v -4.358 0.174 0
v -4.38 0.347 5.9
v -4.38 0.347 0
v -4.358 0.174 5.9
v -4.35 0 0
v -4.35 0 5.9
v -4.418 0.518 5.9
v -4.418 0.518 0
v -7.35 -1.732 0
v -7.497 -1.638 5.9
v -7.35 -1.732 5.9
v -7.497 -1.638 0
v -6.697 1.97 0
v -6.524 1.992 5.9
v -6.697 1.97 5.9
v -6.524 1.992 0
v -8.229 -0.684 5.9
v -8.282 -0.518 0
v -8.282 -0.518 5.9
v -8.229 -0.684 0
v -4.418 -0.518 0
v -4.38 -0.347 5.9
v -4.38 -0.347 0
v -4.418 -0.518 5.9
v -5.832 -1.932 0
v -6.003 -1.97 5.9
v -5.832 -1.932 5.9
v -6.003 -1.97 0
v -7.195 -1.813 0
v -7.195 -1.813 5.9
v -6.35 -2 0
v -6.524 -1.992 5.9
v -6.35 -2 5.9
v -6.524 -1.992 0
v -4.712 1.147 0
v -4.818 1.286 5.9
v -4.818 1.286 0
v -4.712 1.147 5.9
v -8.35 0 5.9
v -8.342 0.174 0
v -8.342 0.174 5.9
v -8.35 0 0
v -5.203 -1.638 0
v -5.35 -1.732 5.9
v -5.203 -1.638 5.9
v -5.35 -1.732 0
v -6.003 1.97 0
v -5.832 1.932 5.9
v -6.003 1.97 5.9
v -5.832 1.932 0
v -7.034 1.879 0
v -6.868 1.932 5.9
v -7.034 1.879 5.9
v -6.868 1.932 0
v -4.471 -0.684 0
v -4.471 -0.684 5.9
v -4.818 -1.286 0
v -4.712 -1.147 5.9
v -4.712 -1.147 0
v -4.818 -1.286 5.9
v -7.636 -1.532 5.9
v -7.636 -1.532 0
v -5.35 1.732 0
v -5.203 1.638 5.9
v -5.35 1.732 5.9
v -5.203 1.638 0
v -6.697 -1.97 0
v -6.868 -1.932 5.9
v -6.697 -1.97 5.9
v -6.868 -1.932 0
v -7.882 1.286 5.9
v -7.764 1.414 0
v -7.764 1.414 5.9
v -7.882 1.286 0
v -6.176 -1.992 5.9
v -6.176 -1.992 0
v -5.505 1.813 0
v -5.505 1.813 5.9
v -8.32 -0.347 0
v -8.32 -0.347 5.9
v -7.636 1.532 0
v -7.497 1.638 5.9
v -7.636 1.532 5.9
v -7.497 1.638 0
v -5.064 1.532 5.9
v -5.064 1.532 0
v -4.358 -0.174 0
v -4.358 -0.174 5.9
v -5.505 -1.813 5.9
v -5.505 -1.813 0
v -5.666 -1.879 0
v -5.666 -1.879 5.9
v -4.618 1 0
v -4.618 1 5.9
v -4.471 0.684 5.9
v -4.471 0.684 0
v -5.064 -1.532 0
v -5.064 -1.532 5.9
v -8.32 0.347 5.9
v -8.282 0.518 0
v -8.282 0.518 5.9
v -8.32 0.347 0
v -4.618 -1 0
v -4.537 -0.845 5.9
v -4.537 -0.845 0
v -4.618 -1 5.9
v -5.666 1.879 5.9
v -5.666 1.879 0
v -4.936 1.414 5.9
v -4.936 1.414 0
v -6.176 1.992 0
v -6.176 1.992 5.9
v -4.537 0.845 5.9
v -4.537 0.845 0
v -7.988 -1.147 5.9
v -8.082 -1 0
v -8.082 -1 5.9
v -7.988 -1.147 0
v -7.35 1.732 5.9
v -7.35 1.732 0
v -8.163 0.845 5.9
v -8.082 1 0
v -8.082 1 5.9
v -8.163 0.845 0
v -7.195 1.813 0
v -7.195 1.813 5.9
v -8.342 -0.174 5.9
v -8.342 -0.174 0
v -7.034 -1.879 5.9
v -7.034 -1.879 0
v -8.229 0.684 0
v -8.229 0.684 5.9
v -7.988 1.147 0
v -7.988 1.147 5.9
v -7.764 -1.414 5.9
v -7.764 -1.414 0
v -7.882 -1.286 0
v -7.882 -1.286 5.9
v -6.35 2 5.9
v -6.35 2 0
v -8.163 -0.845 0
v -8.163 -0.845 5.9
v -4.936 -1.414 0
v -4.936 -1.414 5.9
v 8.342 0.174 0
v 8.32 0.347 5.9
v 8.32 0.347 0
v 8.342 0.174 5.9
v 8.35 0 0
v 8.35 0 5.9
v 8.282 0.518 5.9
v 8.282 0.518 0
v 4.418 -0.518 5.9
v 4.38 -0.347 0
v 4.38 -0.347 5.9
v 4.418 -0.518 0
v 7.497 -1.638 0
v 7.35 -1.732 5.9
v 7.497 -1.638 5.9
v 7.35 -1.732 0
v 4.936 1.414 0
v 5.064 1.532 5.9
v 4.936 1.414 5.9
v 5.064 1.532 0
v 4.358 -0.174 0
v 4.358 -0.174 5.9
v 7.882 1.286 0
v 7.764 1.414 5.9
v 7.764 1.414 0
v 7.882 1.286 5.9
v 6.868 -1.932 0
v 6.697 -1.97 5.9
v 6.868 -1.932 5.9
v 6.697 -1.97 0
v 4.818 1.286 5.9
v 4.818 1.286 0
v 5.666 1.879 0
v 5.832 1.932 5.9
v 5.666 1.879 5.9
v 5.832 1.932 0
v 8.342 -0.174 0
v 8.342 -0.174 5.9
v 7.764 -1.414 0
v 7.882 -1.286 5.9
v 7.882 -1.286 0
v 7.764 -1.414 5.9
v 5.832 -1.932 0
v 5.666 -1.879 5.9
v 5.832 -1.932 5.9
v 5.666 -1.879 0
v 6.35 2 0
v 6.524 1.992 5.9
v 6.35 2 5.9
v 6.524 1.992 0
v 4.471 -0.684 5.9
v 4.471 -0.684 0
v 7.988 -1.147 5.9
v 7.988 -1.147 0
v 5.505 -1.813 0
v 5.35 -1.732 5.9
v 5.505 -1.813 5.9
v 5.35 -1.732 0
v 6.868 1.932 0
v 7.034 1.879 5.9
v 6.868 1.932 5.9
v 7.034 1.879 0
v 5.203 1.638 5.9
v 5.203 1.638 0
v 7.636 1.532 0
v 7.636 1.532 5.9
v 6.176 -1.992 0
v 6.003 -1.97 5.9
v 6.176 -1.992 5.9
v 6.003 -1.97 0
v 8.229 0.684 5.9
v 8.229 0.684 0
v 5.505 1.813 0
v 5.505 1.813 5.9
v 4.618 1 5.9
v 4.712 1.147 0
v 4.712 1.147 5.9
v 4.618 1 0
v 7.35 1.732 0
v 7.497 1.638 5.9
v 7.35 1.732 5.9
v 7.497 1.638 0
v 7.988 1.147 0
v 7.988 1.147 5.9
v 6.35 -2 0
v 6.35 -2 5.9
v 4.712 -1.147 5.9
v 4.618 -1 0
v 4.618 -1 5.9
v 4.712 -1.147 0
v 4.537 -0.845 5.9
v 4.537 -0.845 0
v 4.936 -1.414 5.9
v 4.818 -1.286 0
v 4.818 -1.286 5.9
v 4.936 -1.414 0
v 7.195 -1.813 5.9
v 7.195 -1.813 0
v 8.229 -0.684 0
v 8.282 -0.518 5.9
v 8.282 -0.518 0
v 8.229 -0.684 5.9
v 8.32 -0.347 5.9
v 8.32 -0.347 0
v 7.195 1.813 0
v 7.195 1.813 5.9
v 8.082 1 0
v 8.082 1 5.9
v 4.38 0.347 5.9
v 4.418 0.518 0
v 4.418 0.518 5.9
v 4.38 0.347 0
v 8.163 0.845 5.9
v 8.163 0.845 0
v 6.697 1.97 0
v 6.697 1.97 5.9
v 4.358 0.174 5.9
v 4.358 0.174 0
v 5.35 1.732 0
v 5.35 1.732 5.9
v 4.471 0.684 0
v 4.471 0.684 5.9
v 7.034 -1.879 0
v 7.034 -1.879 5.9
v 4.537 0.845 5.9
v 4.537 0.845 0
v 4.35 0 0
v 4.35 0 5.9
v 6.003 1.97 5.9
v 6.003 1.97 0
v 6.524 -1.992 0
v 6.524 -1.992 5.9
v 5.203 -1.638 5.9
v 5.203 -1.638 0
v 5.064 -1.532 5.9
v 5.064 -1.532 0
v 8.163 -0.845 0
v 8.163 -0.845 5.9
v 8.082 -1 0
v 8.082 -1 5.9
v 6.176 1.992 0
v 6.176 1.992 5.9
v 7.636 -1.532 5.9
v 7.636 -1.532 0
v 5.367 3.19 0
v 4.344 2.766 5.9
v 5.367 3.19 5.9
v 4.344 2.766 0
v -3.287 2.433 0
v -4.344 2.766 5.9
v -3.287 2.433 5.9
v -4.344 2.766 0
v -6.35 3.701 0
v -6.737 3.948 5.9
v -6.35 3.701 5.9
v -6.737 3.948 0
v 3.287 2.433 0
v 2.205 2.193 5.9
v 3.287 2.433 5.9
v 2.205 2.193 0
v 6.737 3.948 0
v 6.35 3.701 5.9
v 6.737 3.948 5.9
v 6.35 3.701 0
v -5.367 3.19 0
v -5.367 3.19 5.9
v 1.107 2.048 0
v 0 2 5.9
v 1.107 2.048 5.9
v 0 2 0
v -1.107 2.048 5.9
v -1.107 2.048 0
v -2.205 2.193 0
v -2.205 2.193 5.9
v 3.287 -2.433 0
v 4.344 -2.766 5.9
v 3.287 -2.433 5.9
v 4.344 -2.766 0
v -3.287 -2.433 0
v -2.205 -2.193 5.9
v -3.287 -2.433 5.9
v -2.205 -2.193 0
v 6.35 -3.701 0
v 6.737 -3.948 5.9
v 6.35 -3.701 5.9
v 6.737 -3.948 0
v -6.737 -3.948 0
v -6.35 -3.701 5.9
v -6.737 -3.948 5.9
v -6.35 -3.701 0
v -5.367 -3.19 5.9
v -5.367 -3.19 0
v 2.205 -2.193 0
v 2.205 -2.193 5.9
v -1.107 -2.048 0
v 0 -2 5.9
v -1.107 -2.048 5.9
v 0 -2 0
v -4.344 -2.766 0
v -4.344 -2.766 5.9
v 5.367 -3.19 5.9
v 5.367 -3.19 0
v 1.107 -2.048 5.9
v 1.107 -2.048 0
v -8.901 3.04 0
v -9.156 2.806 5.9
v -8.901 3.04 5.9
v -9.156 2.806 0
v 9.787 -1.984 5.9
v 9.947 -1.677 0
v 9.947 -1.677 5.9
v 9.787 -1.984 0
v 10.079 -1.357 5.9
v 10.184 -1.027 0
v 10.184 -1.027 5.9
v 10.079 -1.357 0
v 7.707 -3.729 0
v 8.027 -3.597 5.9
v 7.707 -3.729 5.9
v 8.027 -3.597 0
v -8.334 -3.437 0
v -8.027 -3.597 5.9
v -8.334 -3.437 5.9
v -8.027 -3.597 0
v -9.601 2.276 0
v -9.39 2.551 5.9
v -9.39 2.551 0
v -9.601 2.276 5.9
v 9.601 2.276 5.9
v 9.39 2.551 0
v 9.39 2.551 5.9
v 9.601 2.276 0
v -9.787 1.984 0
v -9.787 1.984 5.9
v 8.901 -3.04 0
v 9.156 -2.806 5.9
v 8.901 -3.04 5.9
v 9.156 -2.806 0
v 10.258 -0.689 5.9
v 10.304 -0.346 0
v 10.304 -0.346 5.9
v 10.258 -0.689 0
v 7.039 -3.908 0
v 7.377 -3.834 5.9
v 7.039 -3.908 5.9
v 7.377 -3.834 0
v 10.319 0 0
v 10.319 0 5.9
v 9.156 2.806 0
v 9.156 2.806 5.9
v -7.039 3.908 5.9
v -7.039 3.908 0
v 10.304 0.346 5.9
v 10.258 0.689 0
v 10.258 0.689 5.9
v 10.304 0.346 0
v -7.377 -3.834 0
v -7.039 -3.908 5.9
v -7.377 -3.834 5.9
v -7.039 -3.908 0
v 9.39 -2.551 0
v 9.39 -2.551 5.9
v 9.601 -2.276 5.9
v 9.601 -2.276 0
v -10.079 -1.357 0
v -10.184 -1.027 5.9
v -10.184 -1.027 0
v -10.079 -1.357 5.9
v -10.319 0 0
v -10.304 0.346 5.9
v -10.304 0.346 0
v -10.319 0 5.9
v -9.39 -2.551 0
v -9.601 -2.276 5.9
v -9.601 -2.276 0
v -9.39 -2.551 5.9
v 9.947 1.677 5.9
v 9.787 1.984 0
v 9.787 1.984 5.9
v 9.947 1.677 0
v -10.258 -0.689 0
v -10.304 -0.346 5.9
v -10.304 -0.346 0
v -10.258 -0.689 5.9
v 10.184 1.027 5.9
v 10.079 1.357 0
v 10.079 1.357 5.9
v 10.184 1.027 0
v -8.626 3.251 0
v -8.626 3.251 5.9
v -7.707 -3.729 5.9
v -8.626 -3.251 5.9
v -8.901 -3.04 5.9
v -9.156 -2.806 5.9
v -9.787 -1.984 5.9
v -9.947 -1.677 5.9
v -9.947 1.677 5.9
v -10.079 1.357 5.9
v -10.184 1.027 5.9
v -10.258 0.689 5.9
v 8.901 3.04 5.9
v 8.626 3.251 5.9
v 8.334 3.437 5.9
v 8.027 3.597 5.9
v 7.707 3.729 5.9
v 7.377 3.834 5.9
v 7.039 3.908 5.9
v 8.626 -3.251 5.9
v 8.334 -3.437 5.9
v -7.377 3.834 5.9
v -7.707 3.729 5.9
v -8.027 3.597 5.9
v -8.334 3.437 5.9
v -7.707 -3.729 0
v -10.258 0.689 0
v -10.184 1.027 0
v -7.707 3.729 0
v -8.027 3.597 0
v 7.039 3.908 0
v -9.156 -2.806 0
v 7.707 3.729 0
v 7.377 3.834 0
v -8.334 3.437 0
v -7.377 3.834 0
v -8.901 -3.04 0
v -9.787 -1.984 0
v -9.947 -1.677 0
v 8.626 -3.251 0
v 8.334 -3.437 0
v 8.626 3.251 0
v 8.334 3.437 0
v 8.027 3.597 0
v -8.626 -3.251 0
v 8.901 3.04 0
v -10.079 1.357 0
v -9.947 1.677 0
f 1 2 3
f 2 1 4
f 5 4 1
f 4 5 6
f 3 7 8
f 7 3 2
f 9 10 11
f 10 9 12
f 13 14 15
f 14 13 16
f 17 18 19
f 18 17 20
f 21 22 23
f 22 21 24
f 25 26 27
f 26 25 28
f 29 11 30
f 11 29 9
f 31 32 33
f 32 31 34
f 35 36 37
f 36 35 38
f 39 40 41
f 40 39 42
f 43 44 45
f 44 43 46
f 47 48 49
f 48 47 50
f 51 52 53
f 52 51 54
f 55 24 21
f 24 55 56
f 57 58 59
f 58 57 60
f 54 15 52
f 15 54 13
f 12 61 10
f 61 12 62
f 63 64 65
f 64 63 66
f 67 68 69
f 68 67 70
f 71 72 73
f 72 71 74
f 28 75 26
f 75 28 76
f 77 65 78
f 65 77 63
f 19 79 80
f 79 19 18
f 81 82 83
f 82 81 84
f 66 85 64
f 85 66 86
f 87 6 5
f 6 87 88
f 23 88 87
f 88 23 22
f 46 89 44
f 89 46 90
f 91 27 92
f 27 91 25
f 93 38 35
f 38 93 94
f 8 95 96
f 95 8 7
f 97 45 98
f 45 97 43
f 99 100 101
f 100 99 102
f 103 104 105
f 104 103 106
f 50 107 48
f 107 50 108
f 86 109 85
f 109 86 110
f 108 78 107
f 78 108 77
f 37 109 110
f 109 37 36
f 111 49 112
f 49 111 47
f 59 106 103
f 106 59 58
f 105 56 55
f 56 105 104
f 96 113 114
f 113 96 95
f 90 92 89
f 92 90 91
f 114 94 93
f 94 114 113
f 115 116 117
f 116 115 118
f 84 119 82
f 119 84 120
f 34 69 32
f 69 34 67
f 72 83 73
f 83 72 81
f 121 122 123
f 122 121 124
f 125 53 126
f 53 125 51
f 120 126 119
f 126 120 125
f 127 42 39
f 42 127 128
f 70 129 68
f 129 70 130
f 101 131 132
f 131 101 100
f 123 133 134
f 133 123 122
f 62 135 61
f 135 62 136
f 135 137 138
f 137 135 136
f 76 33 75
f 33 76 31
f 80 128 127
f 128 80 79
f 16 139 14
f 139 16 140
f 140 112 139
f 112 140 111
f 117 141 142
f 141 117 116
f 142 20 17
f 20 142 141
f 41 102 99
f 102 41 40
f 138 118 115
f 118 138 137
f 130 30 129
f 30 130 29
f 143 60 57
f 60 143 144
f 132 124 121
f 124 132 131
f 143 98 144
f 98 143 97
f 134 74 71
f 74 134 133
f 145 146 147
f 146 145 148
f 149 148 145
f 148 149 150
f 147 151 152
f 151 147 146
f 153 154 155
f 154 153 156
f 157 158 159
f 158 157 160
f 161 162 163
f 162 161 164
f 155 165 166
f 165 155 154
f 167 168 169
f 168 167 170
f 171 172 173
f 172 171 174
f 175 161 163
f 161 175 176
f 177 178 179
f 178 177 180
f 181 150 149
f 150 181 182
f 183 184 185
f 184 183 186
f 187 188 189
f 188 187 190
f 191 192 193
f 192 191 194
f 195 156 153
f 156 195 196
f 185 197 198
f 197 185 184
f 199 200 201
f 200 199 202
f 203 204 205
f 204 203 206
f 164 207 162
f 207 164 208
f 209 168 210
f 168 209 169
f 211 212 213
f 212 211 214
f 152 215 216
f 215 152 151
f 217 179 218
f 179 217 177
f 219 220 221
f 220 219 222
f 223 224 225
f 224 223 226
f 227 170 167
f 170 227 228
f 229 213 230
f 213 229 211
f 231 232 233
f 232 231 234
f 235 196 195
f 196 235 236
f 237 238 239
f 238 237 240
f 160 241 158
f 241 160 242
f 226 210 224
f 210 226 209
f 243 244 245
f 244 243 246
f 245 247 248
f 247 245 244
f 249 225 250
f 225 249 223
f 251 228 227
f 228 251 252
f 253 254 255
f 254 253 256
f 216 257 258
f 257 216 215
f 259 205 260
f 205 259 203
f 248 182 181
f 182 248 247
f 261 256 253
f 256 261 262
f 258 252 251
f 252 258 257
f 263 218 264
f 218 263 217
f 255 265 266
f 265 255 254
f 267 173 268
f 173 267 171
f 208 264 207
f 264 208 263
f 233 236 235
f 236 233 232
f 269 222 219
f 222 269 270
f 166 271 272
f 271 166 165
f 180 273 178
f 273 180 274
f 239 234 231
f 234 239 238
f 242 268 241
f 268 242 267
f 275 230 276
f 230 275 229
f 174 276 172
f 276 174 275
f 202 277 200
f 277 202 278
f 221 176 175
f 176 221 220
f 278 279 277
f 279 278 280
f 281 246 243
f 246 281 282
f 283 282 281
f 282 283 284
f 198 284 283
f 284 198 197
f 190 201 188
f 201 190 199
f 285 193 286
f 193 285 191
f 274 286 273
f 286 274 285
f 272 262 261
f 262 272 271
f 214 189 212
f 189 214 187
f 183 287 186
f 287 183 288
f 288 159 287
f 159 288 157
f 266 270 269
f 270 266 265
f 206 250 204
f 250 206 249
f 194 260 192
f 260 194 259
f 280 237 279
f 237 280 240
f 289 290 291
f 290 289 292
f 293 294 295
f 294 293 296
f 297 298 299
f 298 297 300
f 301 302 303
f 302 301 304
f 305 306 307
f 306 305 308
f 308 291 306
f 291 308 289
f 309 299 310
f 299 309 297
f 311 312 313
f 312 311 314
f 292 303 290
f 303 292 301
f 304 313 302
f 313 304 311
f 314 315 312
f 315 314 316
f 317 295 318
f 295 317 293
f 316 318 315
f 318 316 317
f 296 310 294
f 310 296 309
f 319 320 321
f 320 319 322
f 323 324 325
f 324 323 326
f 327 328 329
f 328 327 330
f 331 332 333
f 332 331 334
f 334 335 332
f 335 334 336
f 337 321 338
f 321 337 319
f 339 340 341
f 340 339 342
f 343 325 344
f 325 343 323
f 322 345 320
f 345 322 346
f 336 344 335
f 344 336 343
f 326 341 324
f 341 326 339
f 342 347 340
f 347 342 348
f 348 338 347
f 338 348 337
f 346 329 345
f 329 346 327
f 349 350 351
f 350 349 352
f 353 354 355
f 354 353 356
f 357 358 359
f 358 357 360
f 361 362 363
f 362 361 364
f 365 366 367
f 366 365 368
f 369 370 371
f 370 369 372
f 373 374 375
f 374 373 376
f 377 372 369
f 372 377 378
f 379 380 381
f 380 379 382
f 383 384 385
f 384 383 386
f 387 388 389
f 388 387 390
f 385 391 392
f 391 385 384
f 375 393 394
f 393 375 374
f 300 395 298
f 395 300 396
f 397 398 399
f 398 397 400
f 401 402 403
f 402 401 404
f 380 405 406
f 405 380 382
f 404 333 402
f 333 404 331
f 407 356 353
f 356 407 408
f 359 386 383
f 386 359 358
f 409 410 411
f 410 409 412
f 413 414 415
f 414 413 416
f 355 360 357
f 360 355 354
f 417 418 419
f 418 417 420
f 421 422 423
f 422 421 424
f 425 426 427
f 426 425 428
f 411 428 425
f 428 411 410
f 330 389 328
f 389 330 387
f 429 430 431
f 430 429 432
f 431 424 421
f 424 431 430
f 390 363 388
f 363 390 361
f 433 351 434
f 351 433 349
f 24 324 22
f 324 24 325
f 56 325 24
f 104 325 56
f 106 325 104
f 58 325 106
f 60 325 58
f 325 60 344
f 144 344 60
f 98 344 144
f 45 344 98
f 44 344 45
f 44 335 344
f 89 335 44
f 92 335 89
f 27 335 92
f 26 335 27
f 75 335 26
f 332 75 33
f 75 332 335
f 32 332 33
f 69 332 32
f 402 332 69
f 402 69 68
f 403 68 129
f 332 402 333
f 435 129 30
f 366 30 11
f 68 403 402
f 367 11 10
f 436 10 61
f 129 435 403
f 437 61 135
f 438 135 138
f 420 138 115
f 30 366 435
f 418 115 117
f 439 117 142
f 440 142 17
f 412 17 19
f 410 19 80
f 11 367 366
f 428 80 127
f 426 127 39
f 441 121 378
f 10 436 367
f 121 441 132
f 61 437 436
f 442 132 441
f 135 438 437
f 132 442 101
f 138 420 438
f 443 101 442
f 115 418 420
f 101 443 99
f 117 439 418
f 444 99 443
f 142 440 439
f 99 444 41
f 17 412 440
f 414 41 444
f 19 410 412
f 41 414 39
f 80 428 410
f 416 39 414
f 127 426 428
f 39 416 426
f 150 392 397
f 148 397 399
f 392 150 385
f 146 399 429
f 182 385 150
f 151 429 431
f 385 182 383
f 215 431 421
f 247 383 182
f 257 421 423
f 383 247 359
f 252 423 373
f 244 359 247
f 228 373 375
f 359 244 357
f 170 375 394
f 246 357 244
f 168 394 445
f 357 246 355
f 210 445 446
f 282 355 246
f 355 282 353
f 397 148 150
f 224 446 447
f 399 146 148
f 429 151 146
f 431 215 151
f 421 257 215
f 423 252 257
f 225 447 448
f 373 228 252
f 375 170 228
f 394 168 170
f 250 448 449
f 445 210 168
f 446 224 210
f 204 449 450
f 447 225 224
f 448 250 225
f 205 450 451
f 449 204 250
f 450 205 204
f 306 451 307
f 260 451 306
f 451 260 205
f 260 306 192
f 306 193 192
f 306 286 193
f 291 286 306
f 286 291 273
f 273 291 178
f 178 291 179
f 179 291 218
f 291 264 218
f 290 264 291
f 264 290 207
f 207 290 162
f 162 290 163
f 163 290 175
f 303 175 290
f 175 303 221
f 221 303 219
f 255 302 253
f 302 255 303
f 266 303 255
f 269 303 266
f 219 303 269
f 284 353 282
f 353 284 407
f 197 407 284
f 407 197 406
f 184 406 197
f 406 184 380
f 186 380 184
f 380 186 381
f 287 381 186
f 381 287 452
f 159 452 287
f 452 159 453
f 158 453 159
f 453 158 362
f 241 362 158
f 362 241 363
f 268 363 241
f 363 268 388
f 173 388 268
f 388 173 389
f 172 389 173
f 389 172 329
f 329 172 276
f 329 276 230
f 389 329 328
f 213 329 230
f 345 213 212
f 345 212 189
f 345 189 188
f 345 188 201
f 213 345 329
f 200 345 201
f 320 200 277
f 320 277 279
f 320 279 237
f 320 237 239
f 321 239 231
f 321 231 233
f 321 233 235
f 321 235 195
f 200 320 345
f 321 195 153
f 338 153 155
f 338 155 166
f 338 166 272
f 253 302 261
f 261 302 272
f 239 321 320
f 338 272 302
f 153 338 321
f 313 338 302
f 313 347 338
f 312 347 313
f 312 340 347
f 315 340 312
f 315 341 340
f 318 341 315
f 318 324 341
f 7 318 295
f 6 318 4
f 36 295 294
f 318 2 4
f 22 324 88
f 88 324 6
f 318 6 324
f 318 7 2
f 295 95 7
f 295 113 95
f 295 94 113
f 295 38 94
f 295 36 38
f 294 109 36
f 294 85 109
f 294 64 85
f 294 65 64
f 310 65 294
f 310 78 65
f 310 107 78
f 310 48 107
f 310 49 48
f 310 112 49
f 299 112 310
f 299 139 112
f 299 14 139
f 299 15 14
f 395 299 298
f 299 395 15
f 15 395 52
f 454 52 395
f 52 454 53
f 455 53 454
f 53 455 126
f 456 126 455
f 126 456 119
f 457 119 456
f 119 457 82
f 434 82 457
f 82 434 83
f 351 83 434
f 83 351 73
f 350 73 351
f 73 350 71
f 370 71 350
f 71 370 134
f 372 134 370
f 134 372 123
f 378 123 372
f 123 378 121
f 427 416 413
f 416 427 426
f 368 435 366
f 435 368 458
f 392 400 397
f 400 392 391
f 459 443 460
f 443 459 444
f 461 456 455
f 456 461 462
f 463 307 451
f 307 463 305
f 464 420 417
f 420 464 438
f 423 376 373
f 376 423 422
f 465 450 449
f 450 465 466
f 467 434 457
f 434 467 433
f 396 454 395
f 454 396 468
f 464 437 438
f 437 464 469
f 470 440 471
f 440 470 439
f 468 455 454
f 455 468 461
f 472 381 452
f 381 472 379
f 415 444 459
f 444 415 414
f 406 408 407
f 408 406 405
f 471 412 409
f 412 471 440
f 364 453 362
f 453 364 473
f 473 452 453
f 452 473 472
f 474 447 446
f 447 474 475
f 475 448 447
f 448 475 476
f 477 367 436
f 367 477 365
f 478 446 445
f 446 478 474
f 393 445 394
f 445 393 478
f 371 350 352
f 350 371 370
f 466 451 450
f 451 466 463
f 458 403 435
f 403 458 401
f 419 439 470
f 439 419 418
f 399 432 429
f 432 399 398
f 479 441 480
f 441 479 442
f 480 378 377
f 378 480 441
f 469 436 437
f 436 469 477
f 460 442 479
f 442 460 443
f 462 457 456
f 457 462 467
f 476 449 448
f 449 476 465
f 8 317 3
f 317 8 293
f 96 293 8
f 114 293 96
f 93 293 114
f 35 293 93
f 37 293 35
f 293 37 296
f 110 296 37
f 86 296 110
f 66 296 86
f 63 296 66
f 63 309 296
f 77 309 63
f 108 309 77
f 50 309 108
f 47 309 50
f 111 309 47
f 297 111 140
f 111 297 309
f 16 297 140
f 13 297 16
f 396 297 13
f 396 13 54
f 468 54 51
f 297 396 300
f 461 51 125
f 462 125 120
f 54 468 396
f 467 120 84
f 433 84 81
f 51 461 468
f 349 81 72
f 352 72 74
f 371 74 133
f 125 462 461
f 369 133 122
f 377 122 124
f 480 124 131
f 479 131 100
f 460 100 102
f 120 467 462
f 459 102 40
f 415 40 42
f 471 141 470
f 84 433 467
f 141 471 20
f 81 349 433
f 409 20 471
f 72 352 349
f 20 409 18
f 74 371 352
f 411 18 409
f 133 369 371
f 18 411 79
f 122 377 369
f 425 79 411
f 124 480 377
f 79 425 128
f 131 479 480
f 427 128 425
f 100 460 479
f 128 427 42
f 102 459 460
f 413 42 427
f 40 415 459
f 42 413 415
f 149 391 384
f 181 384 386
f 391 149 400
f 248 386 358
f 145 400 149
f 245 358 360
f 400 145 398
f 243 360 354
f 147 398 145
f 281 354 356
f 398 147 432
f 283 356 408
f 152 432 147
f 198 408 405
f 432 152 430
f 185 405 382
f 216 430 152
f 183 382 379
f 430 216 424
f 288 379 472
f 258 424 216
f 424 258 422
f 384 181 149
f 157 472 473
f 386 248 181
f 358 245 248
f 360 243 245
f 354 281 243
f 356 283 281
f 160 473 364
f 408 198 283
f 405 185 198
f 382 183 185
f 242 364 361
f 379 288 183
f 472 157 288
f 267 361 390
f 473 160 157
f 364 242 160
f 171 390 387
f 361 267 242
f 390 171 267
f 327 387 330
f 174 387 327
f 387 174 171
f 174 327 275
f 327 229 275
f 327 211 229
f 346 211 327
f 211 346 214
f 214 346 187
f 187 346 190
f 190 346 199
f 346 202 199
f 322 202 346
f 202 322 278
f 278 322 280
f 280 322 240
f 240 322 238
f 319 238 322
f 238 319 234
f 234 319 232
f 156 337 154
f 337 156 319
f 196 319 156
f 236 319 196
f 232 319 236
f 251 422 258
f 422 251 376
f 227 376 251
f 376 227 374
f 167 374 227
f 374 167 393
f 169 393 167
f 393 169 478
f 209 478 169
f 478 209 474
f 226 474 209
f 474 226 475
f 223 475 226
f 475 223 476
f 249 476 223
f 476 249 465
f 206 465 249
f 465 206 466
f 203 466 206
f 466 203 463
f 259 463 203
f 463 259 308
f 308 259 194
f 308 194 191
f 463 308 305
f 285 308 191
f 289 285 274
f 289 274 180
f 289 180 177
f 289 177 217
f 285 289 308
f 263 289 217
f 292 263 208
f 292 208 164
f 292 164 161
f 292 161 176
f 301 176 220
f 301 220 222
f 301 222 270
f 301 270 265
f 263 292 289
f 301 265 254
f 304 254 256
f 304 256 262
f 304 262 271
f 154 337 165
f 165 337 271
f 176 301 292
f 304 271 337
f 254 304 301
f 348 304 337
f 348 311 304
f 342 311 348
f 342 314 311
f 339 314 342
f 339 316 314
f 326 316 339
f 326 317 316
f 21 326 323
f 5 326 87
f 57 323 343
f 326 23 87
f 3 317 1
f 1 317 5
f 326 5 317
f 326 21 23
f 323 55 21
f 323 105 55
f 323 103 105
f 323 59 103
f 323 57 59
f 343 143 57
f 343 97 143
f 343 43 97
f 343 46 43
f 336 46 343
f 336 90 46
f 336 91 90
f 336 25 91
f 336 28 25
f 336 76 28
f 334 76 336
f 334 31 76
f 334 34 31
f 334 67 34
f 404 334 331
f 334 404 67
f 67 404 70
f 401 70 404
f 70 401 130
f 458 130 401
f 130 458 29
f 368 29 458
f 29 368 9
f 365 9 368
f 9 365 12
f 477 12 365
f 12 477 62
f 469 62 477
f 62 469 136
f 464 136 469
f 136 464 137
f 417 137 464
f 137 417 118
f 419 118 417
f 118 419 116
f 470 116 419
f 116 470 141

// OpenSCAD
//http://velonews.competitor.com/2016/01/bikes-and-tech/technical-faq/tech-faq-chain-width-explained-compatibility-queries-answered_392163
function inches_to_mm(inches) = inches * 25.4;
default_pitch = inches_to_mm(1/2);
default_roller_diameter = inches_to_mm(5/16);
default_outer_width = 5.9;
default_pin_diameter = 4;

$fn = 72;

chain_link();

module chain_link(
    pitch = undef,
    outer_width = undef,
    pin_diameter = undef,
    roller_diameter = undef,
)
{
    function _pitch() = (pitch != undef) ? pitch : default_pitch;
    function _outer_width() = (outer_width != undef) ? outer_width : default_outer_width;
    function _pin_diameter() = (pin_diameter != undef) ? pin_diameter : default_pin_diameter;
    function _roller_diameter() = (roller_diameter != undef) ? roller_diameter : default_roller_diameter;


    _chain_link(
        pitch = _pitch(),
        outer_width = _outer_width(),
        pin_diameter = _pin_diameter(),
        roller_diameter = _roller_diameter());
}

module _chain_link(
    pitch,
    outer_width,
    pin_diameter,
    roller_diameter
)
{
    difference()
    {
        _body();
        _holes();
    }

    module _body()
    {
        translate([-pitch/2,0,0])
        hull()
        {
            _roller();

            translate([pitch, 0, 0])
            _roller();
        }
    }

    module _holes()
    {
        translate([-pitch/2,0,0])
        _pin_hole();

        translate([pitch/2, 0, 0])
        _pin_hole();

        _bite();

        rotate(180)
        _bite();
    }

    module _roller()
    {
        difference()
        {
            cylinder(d = roller_diameter, h = outer_width);            
        }
    }

    module _pin_hole()
    {
        translate([0,0,-1])
        cylinder(d = pin_diameter, h = outer_width + 2);
    }

    module _bite()
    {
        bite_radius = pitch;

        translate([0, (pin_diameter / 2) + bite_radius, -1])
        cylinder(r = bite_radius, h = outer_width + 2);
    }
}
